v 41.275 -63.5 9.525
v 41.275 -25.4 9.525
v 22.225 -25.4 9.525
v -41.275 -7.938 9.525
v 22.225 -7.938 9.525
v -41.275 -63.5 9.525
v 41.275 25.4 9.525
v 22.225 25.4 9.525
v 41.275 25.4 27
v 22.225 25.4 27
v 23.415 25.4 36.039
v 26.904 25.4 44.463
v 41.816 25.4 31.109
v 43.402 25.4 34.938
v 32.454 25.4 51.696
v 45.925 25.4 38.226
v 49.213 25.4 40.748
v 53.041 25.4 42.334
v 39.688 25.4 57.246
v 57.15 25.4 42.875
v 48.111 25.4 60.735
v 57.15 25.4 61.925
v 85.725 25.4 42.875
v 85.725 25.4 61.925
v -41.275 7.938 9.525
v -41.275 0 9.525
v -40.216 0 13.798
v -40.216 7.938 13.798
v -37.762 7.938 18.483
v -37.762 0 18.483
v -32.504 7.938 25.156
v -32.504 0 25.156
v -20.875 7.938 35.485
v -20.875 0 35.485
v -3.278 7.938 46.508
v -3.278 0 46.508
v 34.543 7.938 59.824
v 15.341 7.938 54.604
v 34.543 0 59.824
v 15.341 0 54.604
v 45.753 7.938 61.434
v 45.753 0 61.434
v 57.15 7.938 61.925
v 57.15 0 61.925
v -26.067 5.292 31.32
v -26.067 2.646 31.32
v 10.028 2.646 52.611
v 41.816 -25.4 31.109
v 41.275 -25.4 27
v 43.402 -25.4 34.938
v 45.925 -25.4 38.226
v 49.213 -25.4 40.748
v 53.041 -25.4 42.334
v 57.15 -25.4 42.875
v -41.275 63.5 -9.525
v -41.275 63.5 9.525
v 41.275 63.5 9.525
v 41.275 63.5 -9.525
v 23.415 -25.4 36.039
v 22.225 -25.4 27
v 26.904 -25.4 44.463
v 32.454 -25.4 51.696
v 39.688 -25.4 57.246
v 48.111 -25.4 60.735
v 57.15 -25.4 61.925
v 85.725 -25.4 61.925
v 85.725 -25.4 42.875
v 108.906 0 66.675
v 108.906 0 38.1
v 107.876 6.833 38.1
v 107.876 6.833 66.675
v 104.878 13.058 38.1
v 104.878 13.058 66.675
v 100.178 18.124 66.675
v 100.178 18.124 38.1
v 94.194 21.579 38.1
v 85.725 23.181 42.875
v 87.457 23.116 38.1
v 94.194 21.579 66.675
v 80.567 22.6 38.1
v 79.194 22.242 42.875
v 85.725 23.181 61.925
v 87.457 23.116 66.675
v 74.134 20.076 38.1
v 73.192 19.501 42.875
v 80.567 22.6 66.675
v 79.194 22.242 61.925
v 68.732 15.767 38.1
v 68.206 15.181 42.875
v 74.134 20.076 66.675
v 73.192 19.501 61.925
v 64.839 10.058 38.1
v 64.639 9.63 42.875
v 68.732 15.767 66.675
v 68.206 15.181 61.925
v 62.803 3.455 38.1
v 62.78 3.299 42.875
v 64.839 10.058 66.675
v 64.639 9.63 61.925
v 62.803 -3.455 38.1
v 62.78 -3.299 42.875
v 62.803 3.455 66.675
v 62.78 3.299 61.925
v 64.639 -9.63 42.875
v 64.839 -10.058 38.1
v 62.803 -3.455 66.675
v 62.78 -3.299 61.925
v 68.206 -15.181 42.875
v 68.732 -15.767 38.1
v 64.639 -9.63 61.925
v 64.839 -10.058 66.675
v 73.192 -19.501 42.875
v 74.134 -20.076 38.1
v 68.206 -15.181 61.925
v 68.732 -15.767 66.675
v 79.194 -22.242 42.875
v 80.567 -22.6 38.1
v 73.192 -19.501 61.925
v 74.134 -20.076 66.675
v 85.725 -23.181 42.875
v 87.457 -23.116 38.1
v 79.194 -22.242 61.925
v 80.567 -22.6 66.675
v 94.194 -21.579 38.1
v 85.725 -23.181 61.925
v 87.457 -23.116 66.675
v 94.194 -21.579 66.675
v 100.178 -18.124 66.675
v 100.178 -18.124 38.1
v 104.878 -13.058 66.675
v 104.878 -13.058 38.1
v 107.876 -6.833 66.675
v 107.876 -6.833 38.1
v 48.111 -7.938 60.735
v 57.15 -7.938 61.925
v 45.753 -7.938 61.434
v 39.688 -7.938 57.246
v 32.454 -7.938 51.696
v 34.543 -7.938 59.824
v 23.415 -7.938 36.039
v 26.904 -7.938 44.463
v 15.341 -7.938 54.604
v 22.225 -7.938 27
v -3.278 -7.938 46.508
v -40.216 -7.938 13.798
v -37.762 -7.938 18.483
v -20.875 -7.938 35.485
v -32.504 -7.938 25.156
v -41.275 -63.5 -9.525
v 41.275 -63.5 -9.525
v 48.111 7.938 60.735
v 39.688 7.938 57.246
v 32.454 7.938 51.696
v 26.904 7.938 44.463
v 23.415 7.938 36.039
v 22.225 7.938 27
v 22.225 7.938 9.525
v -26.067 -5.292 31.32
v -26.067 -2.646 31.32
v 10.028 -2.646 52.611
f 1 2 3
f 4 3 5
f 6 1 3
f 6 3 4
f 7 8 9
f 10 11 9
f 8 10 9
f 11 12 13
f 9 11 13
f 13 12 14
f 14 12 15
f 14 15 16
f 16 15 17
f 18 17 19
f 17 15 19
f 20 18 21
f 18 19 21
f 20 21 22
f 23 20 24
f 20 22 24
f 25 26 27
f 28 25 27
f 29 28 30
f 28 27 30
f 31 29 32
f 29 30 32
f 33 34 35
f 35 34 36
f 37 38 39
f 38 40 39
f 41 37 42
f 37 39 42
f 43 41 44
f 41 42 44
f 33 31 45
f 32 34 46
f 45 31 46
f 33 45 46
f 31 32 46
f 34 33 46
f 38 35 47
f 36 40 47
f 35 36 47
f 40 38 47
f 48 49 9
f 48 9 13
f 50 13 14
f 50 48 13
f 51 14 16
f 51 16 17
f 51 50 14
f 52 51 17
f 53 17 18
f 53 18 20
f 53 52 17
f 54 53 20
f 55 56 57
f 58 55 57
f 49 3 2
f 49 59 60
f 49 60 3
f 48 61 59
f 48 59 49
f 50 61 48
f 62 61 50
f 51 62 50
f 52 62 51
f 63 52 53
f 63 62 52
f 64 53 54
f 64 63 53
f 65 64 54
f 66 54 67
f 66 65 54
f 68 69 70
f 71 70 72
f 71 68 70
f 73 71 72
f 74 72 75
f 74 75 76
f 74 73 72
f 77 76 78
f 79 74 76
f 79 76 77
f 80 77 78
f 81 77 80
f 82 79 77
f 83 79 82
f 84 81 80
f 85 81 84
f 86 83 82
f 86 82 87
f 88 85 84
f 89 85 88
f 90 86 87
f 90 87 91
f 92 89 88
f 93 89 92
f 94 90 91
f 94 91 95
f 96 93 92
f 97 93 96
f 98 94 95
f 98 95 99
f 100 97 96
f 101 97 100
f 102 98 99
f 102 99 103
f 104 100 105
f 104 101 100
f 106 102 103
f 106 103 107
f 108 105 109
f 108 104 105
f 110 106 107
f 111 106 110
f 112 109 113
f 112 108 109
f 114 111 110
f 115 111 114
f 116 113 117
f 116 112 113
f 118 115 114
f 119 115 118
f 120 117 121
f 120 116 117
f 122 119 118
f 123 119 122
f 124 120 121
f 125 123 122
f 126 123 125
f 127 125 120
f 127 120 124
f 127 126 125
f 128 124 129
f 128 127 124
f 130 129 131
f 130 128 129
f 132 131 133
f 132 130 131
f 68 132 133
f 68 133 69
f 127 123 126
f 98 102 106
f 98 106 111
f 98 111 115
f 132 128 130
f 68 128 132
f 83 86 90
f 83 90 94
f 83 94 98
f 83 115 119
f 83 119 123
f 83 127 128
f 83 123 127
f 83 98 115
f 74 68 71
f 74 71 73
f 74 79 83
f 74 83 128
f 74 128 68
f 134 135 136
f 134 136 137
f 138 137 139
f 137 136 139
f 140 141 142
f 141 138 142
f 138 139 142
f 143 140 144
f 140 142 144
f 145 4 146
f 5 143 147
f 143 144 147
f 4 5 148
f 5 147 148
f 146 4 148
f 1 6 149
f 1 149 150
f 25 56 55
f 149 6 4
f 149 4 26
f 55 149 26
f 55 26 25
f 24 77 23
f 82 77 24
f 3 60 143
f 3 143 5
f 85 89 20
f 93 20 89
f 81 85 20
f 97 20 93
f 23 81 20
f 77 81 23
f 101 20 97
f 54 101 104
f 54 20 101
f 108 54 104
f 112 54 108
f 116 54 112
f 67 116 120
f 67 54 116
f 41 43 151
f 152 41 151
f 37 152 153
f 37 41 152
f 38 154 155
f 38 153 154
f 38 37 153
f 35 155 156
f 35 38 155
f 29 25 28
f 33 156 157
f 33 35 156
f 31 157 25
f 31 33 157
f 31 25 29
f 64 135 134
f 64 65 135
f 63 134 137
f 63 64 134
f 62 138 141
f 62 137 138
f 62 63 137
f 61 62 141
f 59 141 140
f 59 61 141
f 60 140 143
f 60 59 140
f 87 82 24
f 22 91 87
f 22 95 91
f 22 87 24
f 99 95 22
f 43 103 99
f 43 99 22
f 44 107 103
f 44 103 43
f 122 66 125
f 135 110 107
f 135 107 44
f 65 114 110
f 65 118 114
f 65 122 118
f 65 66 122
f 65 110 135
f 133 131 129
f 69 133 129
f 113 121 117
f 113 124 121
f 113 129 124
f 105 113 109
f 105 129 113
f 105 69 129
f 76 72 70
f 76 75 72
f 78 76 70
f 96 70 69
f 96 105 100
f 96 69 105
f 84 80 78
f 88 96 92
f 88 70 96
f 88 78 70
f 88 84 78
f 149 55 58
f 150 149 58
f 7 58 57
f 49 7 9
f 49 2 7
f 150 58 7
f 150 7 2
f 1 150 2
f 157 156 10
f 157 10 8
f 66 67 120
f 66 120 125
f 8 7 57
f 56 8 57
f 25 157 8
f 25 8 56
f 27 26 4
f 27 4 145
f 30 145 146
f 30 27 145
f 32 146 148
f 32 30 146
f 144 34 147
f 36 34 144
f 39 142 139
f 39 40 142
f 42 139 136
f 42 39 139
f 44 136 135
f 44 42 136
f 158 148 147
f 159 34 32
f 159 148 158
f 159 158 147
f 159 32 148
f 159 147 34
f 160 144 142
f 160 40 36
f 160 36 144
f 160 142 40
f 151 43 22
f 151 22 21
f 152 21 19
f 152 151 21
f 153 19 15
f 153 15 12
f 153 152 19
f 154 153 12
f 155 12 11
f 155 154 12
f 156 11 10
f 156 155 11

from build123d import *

# Parameters (mm, degrees)
F1_DEPTH = 63.5
F0_W     = 27.6187203676
F0_H     = 19.05
F2_DEPTH = 25.4
F3_DEPTH = 7.9375


with BuildPart() as f1:
    # F0 (on Front) → F1 (new body, symmetric)
    with BuildSketch(Plane.XZ):
        Polygon((-41.275, 9.525), (-41.275, -9.525), (41.275, -9.525), (41.275, 9.525), (22.225, 9.525), align=None)
    extrude(amount=F1_DEPTH, both=True)

    # F0 (on Front) → F2 (join, symmetric)
    with BuildSketch(Plane.XZ):
        with BuildLine():
            Line((22.225, 9.525), (41.275, 9.525))
            Line((41.275, 9.525), (41.275, 27.0002))
            ThreePointArc((41.275, 27.0002), (45.9246798487, 38.2255201513), (57.15, 42.8752))
            Line((57.15, 42.8752), (58.1062796324, 42.8752))
            Line((58.1062796324, 42.8752), (58.1062796324, 61.9252))
            Line((58.1062796324, 61.9252), (57.15, 61.9252))
            ThreePointArc((57.15, 61.9252), (32.4542956671, 51.6959043329), (22.225, 27.0002))
            Line((22.225, 27.0002), (22.225, 9.525))
        make_face()
        with Locations((71.9156398162, 52.4002)):
            Rectangle(F0_W, F0_H)
    extrude(amount=F2_DEPTH, both=True)

    # F0 (on Front) → F3 (join, symmetric)
    with BuildSketch(Plane.XZ):
        with BuildLine():
            add(Edge.make_bspline(
                [(-41.275, 9.525), (-39.7970601916, 27.7465097606), (7.8009576537, 62.4250620604), (57.15, 61.9252)],
                knots=[0, 0, 0, 0, 111.5045361635, 111.5045361635, 111.5045361635, 111.5045361635], degree=3))
            Line((-41.275, 9.525), (22.225, 9.525))
            Line((22.225, 9.525), (22.225, 27.0002))
            ThreePointArc((22.225, 27.0002), (32.4542956671, 51.6959043329), (57.15, 61.9252))
        make_face()
    extrude(amount=F3_DEPTH, both=True)

    # F0 (on Front) → F4 (revolve)
    with BuildSketch(Plane.XZ):
        Polygon((85.725, 66.675), (85.725, 61.9252), (85.725, 42.8752), (85.725, 38.1), (108.9062796324, 38.1), (108.9062796324, 66.675), align=None)
    revolve(axis=Axis((85.725, 0, 52.4002), (0, 0, 1)))


solid = f1.part
